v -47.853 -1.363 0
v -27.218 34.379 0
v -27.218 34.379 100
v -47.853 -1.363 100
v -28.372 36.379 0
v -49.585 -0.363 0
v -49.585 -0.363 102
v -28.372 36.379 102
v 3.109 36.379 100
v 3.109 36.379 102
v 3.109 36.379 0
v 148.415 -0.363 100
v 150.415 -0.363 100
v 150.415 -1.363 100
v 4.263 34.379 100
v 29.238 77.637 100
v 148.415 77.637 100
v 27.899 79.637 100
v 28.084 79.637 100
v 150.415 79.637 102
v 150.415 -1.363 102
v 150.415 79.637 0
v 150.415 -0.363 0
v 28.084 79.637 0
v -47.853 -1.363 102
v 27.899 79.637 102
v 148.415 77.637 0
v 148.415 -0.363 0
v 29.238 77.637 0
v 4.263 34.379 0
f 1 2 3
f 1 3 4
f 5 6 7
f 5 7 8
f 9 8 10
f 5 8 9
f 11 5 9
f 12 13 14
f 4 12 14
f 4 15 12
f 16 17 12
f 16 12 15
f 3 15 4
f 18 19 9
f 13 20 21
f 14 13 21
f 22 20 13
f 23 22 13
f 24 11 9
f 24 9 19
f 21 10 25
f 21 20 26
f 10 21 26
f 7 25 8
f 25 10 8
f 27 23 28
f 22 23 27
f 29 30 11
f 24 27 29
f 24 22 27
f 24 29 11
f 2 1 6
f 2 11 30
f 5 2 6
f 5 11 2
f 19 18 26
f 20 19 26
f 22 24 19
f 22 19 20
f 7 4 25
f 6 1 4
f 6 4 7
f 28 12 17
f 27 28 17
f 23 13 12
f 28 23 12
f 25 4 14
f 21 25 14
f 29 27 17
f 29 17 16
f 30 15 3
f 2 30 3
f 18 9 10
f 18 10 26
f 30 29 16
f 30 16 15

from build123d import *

# Parameters (mm, degrees)
EXTRU_MINCE1_DEPTH = 100
EXTRUSION2_DEPTH   = 2


with BuildPart() as part:
    # Esquisse1 → Extru.-Mince1 (new body)
    with BuildSketch(Plane.XY):
        Polygon((-49.585494923, -0.363286713), (-28.372291487, 36.379059428), (3.108706941, 36.379059428), (28.083525041, 79.636713287), (150.414505077, 79.636713287), (150.414505077, -0.363286713), (148.414505077, -0.363286713), (148.414505077, 77.636713287), (29.238225579, 77.636713287), (4.263407479, 34.379059428), (-27.217590949, 34.379059428), (-47.853444115, -1.363286713), align=None)
    extrude(amount=EXTRU_MINCE1_DEPTH)

    # Esquisse2 → Extrusion2 (add)
    with BuildSketch(Plane.XY.offset(100)):
        Polygon((27.911407902, -1.363286713), (-47.853444115, -1.363286713), (-49.585494923, -0.363286713), (-28.372291487, 36.379059428), (3.108706941, 36.379059428), (27.899141653, 79.636713287), (150.414505077, 79.636713287), (150.414505077, -1.363286713), align=None)
    extrude(amount=EXTRUSION2_DEPTH)


solid = part.part
